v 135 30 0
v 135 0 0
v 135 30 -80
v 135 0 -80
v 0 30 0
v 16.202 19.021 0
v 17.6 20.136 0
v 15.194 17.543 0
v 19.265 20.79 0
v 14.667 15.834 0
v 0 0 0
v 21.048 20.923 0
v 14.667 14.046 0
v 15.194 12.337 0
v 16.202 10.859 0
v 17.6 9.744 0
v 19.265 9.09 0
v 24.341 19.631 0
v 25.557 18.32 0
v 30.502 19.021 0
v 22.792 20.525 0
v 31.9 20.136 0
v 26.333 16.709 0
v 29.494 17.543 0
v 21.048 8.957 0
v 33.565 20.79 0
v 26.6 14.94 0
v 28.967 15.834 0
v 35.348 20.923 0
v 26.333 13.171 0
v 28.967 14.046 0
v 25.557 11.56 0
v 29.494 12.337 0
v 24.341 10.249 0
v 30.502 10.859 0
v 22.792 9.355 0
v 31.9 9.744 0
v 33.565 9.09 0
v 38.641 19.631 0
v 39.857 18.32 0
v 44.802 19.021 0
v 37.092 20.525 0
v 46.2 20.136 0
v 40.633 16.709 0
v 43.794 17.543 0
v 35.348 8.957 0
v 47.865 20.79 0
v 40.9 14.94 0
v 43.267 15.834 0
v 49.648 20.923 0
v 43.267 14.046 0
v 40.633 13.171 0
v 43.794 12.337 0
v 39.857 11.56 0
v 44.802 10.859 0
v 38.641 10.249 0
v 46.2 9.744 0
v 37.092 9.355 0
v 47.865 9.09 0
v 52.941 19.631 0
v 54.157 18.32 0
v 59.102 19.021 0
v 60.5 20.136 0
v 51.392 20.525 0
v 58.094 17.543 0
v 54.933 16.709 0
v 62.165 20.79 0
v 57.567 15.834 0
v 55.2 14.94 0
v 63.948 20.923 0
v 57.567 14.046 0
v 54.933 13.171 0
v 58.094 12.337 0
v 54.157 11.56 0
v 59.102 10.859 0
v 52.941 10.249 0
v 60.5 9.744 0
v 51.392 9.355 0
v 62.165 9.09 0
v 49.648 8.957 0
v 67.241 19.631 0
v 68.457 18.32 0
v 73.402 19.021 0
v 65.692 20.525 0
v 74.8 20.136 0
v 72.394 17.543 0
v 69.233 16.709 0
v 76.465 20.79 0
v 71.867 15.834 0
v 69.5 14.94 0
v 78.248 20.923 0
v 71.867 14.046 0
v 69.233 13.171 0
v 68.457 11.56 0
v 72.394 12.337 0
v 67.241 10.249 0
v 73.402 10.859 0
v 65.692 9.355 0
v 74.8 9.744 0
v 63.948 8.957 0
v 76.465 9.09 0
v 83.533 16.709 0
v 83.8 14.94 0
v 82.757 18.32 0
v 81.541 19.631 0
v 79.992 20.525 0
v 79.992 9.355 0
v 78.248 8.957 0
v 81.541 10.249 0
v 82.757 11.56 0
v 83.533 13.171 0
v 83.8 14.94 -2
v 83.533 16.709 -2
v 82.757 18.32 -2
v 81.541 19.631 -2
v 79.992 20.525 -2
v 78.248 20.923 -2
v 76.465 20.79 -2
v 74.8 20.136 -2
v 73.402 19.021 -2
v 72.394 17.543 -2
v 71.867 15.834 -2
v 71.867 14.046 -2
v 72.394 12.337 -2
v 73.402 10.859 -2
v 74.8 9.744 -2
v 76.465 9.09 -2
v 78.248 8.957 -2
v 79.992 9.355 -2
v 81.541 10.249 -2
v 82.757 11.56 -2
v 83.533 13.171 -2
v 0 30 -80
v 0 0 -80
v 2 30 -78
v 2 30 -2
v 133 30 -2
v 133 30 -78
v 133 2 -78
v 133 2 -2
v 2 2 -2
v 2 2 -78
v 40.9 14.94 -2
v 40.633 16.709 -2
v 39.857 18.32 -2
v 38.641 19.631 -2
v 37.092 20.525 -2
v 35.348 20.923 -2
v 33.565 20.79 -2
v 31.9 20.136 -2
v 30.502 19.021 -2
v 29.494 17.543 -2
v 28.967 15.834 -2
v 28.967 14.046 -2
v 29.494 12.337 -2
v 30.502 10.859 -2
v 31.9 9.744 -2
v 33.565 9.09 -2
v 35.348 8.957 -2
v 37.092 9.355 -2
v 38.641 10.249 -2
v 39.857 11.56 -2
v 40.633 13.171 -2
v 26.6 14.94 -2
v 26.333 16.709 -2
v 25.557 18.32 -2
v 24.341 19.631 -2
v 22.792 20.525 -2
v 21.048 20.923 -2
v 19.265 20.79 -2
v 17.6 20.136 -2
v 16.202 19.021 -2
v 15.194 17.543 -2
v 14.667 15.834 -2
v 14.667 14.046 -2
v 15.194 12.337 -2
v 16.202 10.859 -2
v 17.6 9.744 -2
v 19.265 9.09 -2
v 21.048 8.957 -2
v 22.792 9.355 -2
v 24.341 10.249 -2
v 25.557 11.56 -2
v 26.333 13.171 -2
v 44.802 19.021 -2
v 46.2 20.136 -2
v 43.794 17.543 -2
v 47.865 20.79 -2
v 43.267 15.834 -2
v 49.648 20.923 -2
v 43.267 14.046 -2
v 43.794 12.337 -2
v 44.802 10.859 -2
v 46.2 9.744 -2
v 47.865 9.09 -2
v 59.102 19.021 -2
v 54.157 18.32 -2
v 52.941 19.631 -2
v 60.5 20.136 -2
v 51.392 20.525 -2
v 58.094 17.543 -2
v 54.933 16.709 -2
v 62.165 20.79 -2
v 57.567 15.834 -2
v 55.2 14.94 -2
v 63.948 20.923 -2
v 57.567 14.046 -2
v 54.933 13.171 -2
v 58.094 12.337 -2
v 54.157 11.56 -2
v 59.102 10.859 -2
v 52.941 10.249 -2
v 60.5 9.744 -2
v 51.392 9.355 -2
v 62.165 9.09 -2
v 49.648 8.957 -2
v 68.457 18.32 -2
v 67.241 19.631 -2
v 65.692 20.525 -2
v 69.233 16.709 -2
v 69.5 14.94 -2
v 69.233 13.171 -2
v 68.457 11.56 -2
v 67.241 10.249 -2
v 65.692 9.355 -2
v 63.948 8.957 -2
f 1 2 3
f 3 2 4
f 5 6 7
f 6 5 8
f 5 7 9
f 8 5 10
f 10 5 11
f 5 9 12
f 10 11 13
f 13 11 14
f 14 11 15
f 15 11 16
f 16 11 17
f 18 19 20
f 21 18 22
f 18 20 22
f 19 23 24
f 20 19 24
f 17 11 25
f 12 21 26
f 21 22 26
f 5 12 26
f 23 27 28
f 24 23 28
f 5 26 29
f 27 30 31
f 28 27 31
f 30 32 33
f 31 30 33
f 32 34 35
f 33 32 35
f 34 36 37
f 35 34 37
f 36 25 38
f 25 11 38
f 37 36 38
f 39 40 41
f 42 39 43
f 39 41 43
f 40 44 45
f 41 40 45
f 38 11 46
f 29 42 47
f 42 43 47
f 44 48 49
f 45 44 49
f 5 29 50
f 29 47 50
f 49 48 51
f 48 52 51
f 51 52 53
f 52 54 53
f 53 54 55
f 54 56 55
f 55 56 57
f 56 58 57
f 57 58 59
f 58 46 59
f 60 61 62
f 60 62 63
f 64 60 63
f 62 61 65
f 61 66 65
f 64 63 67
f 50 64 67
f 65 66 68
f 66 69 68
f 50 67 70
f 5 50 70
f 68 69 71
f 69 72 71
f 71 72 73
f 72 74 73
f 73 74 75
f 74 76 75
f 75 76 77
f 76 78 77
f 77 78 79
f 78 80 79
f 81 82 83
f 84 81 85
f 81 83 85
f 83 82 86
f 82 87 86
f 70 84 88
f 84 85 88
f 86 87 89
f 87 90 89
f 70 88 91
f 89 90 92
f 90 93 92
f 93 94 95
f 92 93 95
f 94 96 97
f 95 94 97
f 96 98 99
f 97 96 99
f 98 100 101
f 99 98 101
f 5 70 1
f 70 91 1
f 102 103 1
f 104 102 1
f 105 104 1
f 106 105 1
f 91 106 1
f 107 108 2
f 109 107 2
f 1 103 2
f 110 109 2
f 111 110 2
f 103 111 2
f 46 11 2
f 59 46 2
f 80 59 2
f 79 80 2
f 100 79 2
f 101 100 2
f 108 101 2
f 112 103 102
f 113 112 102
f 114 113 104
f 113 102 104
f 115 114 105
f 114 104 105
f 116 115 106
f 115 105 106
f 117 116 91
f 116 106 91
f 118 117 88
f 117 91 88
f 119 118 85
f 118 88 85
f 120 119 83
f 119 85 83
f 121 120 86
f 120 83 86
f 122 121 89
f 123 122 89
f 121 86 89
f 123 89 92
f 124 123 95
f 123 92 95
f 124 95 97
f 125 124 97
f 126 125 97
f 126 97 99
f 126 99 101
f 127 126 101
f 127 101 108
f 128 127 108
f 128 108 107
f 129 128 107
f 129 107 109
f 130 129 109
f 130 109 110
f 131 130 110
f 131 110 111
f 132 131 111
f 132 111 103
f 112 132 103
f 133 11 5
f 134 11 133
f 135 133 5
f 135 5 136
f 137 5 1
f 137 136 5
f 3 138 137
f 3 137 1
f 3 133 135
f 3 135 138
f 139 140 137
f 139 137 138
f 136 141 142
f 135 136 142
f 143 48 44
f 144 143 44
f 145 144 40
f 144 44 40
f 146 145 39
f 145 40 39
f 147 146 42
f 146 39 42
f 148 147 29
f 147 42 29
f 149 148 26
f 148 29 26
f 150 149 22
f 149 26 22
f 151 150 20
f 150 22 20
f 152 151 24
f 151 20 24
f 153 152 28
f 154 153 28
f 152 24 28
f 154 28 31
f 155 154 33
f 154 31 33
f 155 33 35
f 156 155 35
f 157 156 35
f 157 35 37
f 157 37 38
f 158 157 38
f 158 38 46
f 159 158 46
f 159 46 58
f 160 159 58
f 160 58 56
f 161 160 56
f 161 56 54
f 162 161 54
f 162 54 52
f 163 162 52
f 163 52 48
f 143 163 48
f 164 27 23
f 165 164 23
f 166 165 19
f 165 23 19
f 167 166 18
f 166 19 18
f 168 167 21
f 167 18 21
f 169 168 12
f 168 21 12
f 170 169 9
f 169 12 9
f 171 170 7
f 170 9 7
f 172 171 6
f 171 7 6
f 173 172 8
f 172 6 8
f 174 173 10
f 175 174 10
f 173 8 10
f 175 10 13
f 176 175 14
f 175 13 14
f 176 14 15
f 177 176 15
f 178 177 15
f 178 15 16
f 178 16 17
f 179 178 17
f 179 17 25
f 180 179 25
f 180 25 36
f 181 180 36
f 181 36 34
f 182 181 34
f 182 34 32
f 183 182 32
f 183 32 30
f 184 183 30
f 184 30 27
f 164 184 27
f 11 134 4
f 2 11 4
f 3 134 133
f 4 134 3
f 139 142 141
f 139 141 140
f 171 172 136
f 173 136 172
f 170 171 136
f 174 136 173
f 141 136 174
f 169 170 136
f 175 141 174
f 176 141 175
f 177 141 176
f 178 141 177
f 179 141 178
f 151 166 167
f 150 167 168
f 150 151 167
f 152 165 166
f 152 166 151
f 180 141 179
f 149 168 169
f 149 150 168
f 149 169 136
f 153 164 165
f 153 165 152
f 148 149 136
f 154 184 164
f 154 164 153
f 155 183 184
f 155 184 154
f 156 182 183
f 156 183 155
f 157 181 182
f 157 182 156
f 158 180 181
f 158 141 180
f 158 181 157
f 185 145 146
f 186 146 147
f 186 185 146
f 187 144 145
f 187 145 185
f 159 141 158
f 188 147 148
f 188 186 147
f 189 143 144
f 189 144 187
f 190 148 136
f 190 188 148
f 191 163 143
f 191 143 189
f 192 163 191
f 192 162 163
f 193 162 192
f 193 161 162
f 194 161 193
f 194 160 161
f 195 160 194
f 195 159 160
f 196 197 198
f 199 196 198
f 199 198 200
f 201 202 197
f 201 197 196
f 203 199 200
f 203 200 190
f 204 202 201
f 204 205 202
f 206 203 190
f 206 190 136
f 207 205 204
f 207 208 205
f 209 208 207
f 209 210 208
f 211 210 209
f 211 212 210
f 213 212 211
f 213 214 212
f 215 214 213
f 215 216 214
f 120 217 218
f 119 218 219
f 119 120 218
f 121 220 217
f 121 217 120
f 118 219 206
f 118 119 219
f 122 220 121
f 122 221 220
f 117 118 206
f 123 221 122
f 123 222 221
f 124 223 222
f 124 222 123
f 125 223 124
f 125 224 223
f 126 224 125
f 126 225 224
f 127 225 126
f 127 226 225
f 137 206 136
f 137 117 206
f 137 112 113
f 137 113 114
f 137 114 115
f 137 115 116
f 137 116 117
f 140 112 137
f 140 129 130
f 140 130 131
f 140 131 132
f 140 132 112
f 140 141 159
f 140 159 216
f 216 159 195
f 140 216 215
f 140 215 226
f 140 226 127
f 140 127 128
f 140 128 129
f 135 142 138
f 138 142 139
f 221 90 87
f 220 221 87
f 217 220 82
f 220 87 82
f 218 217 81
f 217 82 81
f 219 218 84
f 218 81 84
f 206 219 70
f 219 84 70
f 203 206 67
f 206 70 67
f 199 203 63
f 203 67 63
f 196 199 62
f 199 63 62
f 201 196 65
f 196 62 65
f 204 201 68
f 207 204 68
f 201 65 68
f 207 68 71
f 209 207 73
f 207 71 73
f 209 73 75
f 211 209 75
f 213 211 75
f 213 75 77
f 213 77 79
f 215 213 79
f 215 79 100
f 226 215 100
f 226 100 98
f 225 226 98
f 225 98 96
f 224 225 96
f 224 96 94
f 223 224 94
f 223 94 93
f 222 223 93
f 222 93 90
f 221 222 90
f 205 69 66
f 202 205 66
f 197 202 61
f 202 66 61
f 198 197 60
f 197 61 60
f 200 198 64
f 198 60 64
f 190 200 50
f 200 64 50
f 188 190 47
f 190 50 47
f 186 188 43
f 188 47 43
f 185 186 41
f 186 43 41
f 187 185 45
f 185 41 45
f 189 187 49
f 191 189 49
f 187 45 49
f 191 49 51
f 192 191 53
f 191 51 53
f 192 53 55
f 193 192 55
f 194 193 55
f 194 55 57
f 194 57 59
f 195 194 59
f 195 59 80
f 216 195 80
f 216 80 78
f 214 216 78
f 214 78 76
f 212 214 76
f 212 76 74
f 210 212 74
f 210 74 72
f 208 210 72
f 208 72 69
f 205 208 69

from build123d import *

# Parameters (mm, degrees)
SKIZZE1_W                       = 135
SKIZZE1_H                       = 80
AUFSATZ_LINEAR_AUSTRAGEN1_DEPTH = 30
SCHALE1_T                       = -2
SKIZZE2_R                       = 6
SCHNITT_LINEAR_AUSTRAGEN1_DEPTH = 30


with BuildPart() as part:
    # Skizze1 → Aufsatz-Linear austragen1 (new body)
    with BuildSketch(Plane(origin=(0, 0, 0), x_dir=(1, 0, 0), z_dir=(0, 1, 0))):
        with Locations((67.5, 40)):
            Rectangle(SKIZZE1_W, SKIZZE1_H)
    extrude(amount=AUFSATZ_LINEAR_AUSTRAGEN1_DEPTH)

    # Schale1
    schale1_openings = [part.faces().sort_by_distance(p)[0] for p in [
        (67.5, 30, -40),
    ]]
    offset(amount=SCHALE1_T, openings=schale1_openings, kind=Kind.INTERSECTION)

    # Skizze2 → Schnitt-Linear austragen1 (cut)
    with BuildSketch(Plane.XY):
        with Locations((20.6, 14.94)):
            Circle(SKIZZE2_R)
        with Locations((34.9, 14.94)):
            Circle(SKIZZE2_R)
        with Locations((49.2, 14.94)):
            Circle(SKIZZE2_R)
        with Locations((63.5, 14.94)):
            Circle(SKIZZE2_R)
        with Locations((77.8, 14.94)):
            Circle(SKIZZE2_R)
    extrude(amount=-SCHNITT_LINEAR_AUSTRAGEN1_DEPTH, mode=Mode.SUBTRACT)


solid = part.part
